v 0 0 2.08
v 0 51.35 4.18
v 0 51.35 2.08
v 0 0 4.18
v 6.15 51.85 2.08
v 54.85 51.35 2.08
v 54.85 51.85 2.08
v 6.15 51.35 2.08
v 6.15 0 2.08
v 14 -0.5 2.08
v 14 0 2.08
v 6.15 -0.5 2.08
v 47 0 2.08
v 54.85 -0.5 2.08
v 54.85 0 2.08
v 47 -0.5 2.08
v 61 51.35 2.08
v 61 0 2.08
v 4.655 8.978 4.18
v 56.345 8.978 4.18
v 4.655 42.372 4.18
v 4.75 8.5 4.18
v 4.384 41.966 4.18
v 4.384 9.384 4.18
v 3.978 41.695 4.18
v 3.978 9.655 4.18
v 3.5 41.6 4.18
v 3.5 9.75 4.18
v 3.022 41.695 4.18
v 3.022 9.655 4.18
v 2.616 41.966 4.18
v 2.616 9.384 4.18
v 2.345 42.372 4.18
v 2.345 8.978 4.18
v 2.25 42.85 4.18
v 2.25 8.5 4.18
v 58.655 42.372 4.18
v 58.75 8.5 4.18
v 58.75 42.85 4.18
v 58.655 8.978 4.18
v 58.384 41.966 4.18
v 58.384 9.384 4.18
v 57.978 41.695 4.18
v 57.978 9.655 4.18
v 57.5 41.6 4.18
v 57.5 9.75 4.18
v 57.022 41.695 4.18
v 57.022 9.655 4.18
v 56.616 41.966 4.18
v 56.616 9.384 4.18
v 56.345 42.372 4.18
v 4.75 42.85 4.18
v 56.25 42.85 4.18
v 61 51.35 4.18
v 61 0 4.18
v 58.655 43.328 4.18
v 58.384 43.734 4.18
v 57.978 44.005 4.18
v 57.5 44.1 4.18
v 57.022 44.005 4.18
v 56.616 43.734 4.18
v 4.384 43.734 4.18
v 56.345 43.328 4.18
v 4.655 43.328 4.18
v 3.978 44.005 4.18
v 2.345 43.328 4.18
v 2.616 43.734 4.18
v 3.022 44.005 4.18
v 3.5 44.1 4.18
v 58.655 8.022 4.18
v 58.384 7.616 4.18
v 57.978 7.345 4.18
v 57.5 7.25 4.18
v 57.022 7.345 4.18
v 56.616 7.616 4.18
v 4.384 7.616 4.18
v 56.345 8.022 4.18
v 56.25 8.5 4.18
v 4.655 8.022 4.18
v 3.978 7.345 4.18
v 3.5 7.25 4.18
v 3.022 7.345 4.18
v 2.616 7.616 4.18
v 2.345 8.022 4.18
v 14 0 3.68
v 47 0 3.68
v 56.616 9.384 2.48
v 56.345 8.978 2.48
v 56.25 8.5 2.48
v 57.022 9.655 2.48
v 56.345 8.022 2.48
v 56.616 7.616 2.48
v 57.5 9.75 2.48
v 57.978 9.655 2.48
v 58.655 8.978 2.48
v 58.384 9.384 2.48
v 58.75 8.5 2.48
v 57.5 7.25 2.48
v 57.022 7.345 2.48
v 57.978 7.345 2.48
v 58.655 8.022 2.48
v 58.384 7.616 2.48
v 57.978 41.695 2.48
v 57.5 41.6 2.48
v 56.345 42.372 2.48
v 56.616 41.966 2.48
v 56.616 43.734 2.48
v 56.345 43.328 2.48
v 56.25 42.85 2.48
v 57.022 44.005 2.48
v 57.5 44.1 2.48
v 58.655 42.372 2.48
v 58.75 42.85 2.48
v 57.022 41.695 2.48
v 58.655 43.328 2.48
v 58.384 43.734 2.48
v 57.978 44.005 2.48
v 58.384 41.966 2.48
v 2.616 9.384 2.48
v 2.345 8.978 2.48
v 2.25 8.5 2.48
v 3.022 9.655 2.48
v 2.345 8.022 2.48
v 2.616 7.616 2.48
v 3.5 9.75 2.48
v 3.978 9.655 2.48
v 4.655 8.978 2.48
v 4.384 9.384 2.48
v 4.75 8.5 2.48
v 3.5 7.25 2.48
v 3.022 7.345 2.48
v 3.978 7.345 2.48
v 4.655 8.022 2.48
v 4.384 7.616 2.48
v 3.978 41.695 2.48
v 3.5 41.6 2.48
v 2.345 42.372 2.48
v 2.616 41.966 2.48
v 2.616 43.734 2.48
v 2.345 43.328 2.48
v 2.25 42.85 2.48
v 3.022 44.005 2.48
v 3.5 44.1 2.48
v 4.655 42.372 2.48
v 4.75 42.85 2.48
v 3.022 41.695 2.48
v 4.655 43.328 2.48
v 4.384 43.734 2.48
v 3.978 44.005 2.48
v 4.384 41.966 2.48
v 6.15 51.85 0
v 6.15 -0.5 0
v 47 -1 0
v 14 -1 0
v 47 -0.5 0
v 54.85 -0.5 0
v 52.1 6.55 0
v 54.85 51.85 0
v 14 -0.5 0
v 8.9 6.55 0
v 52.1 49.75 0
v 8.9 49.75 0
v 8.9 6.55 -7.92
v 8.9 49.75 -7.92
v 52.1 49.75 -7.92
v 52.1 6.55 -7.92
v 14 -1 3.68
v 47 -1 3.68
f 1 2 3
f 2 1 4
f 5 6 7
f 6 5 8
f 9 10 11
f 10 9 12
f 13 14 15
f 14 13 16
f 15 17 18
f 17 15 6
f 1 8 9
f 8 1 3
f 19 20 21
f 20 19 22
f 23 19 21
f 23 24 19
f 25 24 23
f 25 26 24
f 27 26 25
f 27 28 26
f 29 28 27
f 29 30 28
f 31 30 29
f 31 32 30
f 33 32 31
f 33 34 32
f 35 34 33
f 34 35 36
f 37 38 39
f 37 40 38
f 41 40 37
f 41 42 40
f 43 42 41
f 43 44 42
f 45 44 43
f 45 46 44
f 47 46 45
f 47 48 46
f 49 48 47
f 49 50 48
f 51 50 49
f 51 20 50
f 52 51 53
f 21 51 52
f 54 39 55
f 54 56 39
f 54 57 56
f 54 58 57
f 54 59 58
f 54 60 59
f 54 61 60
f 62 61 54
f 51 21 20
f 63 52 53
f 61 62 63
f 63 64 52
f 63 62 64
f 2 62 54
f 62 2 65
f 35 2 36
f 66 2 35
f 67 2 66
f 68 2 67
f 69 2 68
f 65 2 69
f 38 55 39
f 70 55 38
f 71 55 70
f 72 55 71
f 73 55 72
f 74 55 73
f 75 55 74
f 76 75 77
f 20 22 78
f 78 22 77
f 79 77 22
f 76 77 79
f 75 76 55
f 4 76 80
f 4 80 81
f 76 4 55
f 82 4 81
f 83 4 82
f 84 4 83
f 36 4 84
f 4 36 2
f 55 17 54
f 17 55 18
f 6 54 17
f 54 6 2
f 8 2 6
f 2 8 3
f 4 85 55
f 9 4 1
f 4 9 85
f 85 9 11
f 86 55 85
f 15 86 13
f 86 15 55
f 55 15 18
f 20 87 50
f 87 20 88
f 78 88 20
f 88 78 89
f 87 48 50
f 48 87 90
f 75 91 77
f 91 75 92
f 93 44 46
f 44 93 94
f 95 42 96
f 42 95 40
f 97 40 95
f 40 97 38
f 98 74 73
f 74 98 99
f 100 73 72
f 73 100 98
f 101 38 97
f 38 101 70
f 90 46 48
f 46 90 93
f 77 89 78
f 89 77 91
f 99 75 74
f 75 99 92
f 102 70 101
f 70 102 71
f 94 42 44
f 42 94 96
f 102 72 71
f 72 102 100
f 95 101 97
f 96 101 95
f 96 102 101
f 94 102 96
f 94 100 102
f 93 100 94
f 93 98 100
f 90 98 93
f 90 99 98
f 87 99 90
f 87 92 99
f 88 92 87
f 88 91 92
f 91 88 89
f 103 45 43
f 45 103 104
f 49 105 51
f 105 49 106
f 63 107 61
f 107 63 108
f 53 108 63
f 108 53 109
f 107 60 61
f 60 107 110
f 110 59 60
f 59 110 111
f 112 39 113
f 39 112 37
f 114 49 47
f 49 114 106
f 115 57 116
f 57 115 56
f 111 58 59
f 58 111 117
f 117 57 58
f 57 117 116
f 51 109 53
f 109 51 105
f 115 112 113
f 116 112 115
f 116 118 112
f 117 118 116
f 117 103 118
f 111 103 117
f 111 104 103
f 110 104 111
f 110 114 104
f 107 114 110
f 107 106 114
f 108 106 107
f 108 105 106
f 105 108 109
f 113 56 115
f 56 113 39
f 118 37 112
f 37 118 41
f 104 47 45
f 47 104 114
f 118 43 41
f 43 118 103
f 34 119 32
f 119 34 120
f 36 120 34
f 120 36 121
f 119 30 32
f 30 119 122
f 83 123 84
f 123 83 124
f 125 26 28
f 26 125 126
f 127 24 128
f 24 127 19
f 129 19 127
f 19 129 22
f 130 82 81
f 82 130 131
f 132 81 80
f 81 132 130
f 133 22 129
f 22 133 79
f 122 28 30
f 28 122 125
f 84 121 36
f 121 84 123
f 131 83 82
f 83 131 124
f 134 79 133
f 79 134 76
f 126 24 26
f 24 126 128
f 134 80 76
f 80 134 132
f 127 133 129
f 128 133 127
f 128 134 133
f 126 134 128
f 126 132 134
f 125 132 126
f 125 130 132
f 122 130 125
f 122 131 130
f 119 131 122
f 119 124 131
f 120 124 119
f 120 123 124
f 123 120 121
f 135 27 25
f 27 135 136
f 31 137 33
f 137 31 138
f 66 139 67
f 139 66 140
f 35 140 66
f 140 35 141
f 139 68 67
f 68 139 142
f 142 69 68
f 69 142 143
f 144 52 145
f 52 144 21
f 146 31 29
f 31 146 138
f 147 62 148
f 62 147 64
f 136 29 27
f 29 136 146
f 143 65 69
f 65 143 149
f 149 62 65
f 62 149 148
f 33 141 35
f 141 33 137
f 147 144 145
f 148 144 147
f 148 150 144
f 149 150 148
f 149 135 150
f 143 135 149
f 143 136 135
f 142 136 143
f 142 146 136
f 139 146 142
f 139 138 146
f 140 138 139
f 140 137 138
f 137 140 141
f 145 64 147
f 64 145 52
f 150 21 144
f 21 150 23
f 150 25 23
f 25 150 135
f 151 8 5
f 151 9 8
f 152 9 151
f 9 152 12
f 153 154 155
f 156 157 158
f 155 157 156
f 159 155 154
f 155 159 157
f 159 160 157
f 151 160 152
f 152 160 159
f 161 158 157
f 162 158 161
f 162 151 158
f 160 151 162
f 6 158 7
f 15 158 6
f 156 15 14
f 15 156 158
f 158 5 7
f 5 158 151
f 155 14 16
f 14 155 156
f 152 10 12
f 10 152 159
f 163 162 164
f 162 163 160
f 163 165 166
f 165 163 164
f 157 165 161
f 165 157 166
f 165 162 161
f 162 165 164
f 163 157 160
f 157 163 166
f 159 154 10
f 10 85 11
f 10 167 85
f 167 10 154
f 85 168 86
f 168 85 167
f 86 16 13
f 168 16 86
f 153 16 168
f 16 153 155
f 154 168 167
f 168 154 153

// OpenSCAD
$fn=16;
module LCD(){
    cube([47.7+1,51.35+1,3.68-1.6]);
}

module visable_area(){
    cube([43.2,43.2,10]);
}

module PCB(){
    difference(){
        cube([61,51.35,1.6+0.5]);//add 0.5 for extra pin height
        translate([3.5,8.5,-0.1])cylinder(h=1.6+0.2,d=2.5); //changed all r from 3 then changed from 2.8 to 2.5
        translate([3.5,8.5+34.35,-0.1])cylinder(h=1.6+0.2,d=2.5);
        translate([3.5+54,8.5,-0.1])cylinder(h=1.6+0.2,d=2.5);
        translate([3.5+54,8.5+34.35,-0.1])cylinder(h=1.6+0.2,d=2.5);
    }
}

module ribbon(){
    cube([33,1,3.68]);
}
module screen_all(){
   translate([47.7+6.65,0,3.68]) rotate([0,180,0])union(){ 
       color("red") translate([(-6.65),0,-0.5])PCB();
       color("black") translate([-0.5,-0.5,1.6])LCD();
       color("blue") translate([(47.7-43.2)/2,6.55,1.6]) visable_area();
       color("orange") translate([(47.7-33)/2,-1,0])ribbon();
    }
}
screen_all();
